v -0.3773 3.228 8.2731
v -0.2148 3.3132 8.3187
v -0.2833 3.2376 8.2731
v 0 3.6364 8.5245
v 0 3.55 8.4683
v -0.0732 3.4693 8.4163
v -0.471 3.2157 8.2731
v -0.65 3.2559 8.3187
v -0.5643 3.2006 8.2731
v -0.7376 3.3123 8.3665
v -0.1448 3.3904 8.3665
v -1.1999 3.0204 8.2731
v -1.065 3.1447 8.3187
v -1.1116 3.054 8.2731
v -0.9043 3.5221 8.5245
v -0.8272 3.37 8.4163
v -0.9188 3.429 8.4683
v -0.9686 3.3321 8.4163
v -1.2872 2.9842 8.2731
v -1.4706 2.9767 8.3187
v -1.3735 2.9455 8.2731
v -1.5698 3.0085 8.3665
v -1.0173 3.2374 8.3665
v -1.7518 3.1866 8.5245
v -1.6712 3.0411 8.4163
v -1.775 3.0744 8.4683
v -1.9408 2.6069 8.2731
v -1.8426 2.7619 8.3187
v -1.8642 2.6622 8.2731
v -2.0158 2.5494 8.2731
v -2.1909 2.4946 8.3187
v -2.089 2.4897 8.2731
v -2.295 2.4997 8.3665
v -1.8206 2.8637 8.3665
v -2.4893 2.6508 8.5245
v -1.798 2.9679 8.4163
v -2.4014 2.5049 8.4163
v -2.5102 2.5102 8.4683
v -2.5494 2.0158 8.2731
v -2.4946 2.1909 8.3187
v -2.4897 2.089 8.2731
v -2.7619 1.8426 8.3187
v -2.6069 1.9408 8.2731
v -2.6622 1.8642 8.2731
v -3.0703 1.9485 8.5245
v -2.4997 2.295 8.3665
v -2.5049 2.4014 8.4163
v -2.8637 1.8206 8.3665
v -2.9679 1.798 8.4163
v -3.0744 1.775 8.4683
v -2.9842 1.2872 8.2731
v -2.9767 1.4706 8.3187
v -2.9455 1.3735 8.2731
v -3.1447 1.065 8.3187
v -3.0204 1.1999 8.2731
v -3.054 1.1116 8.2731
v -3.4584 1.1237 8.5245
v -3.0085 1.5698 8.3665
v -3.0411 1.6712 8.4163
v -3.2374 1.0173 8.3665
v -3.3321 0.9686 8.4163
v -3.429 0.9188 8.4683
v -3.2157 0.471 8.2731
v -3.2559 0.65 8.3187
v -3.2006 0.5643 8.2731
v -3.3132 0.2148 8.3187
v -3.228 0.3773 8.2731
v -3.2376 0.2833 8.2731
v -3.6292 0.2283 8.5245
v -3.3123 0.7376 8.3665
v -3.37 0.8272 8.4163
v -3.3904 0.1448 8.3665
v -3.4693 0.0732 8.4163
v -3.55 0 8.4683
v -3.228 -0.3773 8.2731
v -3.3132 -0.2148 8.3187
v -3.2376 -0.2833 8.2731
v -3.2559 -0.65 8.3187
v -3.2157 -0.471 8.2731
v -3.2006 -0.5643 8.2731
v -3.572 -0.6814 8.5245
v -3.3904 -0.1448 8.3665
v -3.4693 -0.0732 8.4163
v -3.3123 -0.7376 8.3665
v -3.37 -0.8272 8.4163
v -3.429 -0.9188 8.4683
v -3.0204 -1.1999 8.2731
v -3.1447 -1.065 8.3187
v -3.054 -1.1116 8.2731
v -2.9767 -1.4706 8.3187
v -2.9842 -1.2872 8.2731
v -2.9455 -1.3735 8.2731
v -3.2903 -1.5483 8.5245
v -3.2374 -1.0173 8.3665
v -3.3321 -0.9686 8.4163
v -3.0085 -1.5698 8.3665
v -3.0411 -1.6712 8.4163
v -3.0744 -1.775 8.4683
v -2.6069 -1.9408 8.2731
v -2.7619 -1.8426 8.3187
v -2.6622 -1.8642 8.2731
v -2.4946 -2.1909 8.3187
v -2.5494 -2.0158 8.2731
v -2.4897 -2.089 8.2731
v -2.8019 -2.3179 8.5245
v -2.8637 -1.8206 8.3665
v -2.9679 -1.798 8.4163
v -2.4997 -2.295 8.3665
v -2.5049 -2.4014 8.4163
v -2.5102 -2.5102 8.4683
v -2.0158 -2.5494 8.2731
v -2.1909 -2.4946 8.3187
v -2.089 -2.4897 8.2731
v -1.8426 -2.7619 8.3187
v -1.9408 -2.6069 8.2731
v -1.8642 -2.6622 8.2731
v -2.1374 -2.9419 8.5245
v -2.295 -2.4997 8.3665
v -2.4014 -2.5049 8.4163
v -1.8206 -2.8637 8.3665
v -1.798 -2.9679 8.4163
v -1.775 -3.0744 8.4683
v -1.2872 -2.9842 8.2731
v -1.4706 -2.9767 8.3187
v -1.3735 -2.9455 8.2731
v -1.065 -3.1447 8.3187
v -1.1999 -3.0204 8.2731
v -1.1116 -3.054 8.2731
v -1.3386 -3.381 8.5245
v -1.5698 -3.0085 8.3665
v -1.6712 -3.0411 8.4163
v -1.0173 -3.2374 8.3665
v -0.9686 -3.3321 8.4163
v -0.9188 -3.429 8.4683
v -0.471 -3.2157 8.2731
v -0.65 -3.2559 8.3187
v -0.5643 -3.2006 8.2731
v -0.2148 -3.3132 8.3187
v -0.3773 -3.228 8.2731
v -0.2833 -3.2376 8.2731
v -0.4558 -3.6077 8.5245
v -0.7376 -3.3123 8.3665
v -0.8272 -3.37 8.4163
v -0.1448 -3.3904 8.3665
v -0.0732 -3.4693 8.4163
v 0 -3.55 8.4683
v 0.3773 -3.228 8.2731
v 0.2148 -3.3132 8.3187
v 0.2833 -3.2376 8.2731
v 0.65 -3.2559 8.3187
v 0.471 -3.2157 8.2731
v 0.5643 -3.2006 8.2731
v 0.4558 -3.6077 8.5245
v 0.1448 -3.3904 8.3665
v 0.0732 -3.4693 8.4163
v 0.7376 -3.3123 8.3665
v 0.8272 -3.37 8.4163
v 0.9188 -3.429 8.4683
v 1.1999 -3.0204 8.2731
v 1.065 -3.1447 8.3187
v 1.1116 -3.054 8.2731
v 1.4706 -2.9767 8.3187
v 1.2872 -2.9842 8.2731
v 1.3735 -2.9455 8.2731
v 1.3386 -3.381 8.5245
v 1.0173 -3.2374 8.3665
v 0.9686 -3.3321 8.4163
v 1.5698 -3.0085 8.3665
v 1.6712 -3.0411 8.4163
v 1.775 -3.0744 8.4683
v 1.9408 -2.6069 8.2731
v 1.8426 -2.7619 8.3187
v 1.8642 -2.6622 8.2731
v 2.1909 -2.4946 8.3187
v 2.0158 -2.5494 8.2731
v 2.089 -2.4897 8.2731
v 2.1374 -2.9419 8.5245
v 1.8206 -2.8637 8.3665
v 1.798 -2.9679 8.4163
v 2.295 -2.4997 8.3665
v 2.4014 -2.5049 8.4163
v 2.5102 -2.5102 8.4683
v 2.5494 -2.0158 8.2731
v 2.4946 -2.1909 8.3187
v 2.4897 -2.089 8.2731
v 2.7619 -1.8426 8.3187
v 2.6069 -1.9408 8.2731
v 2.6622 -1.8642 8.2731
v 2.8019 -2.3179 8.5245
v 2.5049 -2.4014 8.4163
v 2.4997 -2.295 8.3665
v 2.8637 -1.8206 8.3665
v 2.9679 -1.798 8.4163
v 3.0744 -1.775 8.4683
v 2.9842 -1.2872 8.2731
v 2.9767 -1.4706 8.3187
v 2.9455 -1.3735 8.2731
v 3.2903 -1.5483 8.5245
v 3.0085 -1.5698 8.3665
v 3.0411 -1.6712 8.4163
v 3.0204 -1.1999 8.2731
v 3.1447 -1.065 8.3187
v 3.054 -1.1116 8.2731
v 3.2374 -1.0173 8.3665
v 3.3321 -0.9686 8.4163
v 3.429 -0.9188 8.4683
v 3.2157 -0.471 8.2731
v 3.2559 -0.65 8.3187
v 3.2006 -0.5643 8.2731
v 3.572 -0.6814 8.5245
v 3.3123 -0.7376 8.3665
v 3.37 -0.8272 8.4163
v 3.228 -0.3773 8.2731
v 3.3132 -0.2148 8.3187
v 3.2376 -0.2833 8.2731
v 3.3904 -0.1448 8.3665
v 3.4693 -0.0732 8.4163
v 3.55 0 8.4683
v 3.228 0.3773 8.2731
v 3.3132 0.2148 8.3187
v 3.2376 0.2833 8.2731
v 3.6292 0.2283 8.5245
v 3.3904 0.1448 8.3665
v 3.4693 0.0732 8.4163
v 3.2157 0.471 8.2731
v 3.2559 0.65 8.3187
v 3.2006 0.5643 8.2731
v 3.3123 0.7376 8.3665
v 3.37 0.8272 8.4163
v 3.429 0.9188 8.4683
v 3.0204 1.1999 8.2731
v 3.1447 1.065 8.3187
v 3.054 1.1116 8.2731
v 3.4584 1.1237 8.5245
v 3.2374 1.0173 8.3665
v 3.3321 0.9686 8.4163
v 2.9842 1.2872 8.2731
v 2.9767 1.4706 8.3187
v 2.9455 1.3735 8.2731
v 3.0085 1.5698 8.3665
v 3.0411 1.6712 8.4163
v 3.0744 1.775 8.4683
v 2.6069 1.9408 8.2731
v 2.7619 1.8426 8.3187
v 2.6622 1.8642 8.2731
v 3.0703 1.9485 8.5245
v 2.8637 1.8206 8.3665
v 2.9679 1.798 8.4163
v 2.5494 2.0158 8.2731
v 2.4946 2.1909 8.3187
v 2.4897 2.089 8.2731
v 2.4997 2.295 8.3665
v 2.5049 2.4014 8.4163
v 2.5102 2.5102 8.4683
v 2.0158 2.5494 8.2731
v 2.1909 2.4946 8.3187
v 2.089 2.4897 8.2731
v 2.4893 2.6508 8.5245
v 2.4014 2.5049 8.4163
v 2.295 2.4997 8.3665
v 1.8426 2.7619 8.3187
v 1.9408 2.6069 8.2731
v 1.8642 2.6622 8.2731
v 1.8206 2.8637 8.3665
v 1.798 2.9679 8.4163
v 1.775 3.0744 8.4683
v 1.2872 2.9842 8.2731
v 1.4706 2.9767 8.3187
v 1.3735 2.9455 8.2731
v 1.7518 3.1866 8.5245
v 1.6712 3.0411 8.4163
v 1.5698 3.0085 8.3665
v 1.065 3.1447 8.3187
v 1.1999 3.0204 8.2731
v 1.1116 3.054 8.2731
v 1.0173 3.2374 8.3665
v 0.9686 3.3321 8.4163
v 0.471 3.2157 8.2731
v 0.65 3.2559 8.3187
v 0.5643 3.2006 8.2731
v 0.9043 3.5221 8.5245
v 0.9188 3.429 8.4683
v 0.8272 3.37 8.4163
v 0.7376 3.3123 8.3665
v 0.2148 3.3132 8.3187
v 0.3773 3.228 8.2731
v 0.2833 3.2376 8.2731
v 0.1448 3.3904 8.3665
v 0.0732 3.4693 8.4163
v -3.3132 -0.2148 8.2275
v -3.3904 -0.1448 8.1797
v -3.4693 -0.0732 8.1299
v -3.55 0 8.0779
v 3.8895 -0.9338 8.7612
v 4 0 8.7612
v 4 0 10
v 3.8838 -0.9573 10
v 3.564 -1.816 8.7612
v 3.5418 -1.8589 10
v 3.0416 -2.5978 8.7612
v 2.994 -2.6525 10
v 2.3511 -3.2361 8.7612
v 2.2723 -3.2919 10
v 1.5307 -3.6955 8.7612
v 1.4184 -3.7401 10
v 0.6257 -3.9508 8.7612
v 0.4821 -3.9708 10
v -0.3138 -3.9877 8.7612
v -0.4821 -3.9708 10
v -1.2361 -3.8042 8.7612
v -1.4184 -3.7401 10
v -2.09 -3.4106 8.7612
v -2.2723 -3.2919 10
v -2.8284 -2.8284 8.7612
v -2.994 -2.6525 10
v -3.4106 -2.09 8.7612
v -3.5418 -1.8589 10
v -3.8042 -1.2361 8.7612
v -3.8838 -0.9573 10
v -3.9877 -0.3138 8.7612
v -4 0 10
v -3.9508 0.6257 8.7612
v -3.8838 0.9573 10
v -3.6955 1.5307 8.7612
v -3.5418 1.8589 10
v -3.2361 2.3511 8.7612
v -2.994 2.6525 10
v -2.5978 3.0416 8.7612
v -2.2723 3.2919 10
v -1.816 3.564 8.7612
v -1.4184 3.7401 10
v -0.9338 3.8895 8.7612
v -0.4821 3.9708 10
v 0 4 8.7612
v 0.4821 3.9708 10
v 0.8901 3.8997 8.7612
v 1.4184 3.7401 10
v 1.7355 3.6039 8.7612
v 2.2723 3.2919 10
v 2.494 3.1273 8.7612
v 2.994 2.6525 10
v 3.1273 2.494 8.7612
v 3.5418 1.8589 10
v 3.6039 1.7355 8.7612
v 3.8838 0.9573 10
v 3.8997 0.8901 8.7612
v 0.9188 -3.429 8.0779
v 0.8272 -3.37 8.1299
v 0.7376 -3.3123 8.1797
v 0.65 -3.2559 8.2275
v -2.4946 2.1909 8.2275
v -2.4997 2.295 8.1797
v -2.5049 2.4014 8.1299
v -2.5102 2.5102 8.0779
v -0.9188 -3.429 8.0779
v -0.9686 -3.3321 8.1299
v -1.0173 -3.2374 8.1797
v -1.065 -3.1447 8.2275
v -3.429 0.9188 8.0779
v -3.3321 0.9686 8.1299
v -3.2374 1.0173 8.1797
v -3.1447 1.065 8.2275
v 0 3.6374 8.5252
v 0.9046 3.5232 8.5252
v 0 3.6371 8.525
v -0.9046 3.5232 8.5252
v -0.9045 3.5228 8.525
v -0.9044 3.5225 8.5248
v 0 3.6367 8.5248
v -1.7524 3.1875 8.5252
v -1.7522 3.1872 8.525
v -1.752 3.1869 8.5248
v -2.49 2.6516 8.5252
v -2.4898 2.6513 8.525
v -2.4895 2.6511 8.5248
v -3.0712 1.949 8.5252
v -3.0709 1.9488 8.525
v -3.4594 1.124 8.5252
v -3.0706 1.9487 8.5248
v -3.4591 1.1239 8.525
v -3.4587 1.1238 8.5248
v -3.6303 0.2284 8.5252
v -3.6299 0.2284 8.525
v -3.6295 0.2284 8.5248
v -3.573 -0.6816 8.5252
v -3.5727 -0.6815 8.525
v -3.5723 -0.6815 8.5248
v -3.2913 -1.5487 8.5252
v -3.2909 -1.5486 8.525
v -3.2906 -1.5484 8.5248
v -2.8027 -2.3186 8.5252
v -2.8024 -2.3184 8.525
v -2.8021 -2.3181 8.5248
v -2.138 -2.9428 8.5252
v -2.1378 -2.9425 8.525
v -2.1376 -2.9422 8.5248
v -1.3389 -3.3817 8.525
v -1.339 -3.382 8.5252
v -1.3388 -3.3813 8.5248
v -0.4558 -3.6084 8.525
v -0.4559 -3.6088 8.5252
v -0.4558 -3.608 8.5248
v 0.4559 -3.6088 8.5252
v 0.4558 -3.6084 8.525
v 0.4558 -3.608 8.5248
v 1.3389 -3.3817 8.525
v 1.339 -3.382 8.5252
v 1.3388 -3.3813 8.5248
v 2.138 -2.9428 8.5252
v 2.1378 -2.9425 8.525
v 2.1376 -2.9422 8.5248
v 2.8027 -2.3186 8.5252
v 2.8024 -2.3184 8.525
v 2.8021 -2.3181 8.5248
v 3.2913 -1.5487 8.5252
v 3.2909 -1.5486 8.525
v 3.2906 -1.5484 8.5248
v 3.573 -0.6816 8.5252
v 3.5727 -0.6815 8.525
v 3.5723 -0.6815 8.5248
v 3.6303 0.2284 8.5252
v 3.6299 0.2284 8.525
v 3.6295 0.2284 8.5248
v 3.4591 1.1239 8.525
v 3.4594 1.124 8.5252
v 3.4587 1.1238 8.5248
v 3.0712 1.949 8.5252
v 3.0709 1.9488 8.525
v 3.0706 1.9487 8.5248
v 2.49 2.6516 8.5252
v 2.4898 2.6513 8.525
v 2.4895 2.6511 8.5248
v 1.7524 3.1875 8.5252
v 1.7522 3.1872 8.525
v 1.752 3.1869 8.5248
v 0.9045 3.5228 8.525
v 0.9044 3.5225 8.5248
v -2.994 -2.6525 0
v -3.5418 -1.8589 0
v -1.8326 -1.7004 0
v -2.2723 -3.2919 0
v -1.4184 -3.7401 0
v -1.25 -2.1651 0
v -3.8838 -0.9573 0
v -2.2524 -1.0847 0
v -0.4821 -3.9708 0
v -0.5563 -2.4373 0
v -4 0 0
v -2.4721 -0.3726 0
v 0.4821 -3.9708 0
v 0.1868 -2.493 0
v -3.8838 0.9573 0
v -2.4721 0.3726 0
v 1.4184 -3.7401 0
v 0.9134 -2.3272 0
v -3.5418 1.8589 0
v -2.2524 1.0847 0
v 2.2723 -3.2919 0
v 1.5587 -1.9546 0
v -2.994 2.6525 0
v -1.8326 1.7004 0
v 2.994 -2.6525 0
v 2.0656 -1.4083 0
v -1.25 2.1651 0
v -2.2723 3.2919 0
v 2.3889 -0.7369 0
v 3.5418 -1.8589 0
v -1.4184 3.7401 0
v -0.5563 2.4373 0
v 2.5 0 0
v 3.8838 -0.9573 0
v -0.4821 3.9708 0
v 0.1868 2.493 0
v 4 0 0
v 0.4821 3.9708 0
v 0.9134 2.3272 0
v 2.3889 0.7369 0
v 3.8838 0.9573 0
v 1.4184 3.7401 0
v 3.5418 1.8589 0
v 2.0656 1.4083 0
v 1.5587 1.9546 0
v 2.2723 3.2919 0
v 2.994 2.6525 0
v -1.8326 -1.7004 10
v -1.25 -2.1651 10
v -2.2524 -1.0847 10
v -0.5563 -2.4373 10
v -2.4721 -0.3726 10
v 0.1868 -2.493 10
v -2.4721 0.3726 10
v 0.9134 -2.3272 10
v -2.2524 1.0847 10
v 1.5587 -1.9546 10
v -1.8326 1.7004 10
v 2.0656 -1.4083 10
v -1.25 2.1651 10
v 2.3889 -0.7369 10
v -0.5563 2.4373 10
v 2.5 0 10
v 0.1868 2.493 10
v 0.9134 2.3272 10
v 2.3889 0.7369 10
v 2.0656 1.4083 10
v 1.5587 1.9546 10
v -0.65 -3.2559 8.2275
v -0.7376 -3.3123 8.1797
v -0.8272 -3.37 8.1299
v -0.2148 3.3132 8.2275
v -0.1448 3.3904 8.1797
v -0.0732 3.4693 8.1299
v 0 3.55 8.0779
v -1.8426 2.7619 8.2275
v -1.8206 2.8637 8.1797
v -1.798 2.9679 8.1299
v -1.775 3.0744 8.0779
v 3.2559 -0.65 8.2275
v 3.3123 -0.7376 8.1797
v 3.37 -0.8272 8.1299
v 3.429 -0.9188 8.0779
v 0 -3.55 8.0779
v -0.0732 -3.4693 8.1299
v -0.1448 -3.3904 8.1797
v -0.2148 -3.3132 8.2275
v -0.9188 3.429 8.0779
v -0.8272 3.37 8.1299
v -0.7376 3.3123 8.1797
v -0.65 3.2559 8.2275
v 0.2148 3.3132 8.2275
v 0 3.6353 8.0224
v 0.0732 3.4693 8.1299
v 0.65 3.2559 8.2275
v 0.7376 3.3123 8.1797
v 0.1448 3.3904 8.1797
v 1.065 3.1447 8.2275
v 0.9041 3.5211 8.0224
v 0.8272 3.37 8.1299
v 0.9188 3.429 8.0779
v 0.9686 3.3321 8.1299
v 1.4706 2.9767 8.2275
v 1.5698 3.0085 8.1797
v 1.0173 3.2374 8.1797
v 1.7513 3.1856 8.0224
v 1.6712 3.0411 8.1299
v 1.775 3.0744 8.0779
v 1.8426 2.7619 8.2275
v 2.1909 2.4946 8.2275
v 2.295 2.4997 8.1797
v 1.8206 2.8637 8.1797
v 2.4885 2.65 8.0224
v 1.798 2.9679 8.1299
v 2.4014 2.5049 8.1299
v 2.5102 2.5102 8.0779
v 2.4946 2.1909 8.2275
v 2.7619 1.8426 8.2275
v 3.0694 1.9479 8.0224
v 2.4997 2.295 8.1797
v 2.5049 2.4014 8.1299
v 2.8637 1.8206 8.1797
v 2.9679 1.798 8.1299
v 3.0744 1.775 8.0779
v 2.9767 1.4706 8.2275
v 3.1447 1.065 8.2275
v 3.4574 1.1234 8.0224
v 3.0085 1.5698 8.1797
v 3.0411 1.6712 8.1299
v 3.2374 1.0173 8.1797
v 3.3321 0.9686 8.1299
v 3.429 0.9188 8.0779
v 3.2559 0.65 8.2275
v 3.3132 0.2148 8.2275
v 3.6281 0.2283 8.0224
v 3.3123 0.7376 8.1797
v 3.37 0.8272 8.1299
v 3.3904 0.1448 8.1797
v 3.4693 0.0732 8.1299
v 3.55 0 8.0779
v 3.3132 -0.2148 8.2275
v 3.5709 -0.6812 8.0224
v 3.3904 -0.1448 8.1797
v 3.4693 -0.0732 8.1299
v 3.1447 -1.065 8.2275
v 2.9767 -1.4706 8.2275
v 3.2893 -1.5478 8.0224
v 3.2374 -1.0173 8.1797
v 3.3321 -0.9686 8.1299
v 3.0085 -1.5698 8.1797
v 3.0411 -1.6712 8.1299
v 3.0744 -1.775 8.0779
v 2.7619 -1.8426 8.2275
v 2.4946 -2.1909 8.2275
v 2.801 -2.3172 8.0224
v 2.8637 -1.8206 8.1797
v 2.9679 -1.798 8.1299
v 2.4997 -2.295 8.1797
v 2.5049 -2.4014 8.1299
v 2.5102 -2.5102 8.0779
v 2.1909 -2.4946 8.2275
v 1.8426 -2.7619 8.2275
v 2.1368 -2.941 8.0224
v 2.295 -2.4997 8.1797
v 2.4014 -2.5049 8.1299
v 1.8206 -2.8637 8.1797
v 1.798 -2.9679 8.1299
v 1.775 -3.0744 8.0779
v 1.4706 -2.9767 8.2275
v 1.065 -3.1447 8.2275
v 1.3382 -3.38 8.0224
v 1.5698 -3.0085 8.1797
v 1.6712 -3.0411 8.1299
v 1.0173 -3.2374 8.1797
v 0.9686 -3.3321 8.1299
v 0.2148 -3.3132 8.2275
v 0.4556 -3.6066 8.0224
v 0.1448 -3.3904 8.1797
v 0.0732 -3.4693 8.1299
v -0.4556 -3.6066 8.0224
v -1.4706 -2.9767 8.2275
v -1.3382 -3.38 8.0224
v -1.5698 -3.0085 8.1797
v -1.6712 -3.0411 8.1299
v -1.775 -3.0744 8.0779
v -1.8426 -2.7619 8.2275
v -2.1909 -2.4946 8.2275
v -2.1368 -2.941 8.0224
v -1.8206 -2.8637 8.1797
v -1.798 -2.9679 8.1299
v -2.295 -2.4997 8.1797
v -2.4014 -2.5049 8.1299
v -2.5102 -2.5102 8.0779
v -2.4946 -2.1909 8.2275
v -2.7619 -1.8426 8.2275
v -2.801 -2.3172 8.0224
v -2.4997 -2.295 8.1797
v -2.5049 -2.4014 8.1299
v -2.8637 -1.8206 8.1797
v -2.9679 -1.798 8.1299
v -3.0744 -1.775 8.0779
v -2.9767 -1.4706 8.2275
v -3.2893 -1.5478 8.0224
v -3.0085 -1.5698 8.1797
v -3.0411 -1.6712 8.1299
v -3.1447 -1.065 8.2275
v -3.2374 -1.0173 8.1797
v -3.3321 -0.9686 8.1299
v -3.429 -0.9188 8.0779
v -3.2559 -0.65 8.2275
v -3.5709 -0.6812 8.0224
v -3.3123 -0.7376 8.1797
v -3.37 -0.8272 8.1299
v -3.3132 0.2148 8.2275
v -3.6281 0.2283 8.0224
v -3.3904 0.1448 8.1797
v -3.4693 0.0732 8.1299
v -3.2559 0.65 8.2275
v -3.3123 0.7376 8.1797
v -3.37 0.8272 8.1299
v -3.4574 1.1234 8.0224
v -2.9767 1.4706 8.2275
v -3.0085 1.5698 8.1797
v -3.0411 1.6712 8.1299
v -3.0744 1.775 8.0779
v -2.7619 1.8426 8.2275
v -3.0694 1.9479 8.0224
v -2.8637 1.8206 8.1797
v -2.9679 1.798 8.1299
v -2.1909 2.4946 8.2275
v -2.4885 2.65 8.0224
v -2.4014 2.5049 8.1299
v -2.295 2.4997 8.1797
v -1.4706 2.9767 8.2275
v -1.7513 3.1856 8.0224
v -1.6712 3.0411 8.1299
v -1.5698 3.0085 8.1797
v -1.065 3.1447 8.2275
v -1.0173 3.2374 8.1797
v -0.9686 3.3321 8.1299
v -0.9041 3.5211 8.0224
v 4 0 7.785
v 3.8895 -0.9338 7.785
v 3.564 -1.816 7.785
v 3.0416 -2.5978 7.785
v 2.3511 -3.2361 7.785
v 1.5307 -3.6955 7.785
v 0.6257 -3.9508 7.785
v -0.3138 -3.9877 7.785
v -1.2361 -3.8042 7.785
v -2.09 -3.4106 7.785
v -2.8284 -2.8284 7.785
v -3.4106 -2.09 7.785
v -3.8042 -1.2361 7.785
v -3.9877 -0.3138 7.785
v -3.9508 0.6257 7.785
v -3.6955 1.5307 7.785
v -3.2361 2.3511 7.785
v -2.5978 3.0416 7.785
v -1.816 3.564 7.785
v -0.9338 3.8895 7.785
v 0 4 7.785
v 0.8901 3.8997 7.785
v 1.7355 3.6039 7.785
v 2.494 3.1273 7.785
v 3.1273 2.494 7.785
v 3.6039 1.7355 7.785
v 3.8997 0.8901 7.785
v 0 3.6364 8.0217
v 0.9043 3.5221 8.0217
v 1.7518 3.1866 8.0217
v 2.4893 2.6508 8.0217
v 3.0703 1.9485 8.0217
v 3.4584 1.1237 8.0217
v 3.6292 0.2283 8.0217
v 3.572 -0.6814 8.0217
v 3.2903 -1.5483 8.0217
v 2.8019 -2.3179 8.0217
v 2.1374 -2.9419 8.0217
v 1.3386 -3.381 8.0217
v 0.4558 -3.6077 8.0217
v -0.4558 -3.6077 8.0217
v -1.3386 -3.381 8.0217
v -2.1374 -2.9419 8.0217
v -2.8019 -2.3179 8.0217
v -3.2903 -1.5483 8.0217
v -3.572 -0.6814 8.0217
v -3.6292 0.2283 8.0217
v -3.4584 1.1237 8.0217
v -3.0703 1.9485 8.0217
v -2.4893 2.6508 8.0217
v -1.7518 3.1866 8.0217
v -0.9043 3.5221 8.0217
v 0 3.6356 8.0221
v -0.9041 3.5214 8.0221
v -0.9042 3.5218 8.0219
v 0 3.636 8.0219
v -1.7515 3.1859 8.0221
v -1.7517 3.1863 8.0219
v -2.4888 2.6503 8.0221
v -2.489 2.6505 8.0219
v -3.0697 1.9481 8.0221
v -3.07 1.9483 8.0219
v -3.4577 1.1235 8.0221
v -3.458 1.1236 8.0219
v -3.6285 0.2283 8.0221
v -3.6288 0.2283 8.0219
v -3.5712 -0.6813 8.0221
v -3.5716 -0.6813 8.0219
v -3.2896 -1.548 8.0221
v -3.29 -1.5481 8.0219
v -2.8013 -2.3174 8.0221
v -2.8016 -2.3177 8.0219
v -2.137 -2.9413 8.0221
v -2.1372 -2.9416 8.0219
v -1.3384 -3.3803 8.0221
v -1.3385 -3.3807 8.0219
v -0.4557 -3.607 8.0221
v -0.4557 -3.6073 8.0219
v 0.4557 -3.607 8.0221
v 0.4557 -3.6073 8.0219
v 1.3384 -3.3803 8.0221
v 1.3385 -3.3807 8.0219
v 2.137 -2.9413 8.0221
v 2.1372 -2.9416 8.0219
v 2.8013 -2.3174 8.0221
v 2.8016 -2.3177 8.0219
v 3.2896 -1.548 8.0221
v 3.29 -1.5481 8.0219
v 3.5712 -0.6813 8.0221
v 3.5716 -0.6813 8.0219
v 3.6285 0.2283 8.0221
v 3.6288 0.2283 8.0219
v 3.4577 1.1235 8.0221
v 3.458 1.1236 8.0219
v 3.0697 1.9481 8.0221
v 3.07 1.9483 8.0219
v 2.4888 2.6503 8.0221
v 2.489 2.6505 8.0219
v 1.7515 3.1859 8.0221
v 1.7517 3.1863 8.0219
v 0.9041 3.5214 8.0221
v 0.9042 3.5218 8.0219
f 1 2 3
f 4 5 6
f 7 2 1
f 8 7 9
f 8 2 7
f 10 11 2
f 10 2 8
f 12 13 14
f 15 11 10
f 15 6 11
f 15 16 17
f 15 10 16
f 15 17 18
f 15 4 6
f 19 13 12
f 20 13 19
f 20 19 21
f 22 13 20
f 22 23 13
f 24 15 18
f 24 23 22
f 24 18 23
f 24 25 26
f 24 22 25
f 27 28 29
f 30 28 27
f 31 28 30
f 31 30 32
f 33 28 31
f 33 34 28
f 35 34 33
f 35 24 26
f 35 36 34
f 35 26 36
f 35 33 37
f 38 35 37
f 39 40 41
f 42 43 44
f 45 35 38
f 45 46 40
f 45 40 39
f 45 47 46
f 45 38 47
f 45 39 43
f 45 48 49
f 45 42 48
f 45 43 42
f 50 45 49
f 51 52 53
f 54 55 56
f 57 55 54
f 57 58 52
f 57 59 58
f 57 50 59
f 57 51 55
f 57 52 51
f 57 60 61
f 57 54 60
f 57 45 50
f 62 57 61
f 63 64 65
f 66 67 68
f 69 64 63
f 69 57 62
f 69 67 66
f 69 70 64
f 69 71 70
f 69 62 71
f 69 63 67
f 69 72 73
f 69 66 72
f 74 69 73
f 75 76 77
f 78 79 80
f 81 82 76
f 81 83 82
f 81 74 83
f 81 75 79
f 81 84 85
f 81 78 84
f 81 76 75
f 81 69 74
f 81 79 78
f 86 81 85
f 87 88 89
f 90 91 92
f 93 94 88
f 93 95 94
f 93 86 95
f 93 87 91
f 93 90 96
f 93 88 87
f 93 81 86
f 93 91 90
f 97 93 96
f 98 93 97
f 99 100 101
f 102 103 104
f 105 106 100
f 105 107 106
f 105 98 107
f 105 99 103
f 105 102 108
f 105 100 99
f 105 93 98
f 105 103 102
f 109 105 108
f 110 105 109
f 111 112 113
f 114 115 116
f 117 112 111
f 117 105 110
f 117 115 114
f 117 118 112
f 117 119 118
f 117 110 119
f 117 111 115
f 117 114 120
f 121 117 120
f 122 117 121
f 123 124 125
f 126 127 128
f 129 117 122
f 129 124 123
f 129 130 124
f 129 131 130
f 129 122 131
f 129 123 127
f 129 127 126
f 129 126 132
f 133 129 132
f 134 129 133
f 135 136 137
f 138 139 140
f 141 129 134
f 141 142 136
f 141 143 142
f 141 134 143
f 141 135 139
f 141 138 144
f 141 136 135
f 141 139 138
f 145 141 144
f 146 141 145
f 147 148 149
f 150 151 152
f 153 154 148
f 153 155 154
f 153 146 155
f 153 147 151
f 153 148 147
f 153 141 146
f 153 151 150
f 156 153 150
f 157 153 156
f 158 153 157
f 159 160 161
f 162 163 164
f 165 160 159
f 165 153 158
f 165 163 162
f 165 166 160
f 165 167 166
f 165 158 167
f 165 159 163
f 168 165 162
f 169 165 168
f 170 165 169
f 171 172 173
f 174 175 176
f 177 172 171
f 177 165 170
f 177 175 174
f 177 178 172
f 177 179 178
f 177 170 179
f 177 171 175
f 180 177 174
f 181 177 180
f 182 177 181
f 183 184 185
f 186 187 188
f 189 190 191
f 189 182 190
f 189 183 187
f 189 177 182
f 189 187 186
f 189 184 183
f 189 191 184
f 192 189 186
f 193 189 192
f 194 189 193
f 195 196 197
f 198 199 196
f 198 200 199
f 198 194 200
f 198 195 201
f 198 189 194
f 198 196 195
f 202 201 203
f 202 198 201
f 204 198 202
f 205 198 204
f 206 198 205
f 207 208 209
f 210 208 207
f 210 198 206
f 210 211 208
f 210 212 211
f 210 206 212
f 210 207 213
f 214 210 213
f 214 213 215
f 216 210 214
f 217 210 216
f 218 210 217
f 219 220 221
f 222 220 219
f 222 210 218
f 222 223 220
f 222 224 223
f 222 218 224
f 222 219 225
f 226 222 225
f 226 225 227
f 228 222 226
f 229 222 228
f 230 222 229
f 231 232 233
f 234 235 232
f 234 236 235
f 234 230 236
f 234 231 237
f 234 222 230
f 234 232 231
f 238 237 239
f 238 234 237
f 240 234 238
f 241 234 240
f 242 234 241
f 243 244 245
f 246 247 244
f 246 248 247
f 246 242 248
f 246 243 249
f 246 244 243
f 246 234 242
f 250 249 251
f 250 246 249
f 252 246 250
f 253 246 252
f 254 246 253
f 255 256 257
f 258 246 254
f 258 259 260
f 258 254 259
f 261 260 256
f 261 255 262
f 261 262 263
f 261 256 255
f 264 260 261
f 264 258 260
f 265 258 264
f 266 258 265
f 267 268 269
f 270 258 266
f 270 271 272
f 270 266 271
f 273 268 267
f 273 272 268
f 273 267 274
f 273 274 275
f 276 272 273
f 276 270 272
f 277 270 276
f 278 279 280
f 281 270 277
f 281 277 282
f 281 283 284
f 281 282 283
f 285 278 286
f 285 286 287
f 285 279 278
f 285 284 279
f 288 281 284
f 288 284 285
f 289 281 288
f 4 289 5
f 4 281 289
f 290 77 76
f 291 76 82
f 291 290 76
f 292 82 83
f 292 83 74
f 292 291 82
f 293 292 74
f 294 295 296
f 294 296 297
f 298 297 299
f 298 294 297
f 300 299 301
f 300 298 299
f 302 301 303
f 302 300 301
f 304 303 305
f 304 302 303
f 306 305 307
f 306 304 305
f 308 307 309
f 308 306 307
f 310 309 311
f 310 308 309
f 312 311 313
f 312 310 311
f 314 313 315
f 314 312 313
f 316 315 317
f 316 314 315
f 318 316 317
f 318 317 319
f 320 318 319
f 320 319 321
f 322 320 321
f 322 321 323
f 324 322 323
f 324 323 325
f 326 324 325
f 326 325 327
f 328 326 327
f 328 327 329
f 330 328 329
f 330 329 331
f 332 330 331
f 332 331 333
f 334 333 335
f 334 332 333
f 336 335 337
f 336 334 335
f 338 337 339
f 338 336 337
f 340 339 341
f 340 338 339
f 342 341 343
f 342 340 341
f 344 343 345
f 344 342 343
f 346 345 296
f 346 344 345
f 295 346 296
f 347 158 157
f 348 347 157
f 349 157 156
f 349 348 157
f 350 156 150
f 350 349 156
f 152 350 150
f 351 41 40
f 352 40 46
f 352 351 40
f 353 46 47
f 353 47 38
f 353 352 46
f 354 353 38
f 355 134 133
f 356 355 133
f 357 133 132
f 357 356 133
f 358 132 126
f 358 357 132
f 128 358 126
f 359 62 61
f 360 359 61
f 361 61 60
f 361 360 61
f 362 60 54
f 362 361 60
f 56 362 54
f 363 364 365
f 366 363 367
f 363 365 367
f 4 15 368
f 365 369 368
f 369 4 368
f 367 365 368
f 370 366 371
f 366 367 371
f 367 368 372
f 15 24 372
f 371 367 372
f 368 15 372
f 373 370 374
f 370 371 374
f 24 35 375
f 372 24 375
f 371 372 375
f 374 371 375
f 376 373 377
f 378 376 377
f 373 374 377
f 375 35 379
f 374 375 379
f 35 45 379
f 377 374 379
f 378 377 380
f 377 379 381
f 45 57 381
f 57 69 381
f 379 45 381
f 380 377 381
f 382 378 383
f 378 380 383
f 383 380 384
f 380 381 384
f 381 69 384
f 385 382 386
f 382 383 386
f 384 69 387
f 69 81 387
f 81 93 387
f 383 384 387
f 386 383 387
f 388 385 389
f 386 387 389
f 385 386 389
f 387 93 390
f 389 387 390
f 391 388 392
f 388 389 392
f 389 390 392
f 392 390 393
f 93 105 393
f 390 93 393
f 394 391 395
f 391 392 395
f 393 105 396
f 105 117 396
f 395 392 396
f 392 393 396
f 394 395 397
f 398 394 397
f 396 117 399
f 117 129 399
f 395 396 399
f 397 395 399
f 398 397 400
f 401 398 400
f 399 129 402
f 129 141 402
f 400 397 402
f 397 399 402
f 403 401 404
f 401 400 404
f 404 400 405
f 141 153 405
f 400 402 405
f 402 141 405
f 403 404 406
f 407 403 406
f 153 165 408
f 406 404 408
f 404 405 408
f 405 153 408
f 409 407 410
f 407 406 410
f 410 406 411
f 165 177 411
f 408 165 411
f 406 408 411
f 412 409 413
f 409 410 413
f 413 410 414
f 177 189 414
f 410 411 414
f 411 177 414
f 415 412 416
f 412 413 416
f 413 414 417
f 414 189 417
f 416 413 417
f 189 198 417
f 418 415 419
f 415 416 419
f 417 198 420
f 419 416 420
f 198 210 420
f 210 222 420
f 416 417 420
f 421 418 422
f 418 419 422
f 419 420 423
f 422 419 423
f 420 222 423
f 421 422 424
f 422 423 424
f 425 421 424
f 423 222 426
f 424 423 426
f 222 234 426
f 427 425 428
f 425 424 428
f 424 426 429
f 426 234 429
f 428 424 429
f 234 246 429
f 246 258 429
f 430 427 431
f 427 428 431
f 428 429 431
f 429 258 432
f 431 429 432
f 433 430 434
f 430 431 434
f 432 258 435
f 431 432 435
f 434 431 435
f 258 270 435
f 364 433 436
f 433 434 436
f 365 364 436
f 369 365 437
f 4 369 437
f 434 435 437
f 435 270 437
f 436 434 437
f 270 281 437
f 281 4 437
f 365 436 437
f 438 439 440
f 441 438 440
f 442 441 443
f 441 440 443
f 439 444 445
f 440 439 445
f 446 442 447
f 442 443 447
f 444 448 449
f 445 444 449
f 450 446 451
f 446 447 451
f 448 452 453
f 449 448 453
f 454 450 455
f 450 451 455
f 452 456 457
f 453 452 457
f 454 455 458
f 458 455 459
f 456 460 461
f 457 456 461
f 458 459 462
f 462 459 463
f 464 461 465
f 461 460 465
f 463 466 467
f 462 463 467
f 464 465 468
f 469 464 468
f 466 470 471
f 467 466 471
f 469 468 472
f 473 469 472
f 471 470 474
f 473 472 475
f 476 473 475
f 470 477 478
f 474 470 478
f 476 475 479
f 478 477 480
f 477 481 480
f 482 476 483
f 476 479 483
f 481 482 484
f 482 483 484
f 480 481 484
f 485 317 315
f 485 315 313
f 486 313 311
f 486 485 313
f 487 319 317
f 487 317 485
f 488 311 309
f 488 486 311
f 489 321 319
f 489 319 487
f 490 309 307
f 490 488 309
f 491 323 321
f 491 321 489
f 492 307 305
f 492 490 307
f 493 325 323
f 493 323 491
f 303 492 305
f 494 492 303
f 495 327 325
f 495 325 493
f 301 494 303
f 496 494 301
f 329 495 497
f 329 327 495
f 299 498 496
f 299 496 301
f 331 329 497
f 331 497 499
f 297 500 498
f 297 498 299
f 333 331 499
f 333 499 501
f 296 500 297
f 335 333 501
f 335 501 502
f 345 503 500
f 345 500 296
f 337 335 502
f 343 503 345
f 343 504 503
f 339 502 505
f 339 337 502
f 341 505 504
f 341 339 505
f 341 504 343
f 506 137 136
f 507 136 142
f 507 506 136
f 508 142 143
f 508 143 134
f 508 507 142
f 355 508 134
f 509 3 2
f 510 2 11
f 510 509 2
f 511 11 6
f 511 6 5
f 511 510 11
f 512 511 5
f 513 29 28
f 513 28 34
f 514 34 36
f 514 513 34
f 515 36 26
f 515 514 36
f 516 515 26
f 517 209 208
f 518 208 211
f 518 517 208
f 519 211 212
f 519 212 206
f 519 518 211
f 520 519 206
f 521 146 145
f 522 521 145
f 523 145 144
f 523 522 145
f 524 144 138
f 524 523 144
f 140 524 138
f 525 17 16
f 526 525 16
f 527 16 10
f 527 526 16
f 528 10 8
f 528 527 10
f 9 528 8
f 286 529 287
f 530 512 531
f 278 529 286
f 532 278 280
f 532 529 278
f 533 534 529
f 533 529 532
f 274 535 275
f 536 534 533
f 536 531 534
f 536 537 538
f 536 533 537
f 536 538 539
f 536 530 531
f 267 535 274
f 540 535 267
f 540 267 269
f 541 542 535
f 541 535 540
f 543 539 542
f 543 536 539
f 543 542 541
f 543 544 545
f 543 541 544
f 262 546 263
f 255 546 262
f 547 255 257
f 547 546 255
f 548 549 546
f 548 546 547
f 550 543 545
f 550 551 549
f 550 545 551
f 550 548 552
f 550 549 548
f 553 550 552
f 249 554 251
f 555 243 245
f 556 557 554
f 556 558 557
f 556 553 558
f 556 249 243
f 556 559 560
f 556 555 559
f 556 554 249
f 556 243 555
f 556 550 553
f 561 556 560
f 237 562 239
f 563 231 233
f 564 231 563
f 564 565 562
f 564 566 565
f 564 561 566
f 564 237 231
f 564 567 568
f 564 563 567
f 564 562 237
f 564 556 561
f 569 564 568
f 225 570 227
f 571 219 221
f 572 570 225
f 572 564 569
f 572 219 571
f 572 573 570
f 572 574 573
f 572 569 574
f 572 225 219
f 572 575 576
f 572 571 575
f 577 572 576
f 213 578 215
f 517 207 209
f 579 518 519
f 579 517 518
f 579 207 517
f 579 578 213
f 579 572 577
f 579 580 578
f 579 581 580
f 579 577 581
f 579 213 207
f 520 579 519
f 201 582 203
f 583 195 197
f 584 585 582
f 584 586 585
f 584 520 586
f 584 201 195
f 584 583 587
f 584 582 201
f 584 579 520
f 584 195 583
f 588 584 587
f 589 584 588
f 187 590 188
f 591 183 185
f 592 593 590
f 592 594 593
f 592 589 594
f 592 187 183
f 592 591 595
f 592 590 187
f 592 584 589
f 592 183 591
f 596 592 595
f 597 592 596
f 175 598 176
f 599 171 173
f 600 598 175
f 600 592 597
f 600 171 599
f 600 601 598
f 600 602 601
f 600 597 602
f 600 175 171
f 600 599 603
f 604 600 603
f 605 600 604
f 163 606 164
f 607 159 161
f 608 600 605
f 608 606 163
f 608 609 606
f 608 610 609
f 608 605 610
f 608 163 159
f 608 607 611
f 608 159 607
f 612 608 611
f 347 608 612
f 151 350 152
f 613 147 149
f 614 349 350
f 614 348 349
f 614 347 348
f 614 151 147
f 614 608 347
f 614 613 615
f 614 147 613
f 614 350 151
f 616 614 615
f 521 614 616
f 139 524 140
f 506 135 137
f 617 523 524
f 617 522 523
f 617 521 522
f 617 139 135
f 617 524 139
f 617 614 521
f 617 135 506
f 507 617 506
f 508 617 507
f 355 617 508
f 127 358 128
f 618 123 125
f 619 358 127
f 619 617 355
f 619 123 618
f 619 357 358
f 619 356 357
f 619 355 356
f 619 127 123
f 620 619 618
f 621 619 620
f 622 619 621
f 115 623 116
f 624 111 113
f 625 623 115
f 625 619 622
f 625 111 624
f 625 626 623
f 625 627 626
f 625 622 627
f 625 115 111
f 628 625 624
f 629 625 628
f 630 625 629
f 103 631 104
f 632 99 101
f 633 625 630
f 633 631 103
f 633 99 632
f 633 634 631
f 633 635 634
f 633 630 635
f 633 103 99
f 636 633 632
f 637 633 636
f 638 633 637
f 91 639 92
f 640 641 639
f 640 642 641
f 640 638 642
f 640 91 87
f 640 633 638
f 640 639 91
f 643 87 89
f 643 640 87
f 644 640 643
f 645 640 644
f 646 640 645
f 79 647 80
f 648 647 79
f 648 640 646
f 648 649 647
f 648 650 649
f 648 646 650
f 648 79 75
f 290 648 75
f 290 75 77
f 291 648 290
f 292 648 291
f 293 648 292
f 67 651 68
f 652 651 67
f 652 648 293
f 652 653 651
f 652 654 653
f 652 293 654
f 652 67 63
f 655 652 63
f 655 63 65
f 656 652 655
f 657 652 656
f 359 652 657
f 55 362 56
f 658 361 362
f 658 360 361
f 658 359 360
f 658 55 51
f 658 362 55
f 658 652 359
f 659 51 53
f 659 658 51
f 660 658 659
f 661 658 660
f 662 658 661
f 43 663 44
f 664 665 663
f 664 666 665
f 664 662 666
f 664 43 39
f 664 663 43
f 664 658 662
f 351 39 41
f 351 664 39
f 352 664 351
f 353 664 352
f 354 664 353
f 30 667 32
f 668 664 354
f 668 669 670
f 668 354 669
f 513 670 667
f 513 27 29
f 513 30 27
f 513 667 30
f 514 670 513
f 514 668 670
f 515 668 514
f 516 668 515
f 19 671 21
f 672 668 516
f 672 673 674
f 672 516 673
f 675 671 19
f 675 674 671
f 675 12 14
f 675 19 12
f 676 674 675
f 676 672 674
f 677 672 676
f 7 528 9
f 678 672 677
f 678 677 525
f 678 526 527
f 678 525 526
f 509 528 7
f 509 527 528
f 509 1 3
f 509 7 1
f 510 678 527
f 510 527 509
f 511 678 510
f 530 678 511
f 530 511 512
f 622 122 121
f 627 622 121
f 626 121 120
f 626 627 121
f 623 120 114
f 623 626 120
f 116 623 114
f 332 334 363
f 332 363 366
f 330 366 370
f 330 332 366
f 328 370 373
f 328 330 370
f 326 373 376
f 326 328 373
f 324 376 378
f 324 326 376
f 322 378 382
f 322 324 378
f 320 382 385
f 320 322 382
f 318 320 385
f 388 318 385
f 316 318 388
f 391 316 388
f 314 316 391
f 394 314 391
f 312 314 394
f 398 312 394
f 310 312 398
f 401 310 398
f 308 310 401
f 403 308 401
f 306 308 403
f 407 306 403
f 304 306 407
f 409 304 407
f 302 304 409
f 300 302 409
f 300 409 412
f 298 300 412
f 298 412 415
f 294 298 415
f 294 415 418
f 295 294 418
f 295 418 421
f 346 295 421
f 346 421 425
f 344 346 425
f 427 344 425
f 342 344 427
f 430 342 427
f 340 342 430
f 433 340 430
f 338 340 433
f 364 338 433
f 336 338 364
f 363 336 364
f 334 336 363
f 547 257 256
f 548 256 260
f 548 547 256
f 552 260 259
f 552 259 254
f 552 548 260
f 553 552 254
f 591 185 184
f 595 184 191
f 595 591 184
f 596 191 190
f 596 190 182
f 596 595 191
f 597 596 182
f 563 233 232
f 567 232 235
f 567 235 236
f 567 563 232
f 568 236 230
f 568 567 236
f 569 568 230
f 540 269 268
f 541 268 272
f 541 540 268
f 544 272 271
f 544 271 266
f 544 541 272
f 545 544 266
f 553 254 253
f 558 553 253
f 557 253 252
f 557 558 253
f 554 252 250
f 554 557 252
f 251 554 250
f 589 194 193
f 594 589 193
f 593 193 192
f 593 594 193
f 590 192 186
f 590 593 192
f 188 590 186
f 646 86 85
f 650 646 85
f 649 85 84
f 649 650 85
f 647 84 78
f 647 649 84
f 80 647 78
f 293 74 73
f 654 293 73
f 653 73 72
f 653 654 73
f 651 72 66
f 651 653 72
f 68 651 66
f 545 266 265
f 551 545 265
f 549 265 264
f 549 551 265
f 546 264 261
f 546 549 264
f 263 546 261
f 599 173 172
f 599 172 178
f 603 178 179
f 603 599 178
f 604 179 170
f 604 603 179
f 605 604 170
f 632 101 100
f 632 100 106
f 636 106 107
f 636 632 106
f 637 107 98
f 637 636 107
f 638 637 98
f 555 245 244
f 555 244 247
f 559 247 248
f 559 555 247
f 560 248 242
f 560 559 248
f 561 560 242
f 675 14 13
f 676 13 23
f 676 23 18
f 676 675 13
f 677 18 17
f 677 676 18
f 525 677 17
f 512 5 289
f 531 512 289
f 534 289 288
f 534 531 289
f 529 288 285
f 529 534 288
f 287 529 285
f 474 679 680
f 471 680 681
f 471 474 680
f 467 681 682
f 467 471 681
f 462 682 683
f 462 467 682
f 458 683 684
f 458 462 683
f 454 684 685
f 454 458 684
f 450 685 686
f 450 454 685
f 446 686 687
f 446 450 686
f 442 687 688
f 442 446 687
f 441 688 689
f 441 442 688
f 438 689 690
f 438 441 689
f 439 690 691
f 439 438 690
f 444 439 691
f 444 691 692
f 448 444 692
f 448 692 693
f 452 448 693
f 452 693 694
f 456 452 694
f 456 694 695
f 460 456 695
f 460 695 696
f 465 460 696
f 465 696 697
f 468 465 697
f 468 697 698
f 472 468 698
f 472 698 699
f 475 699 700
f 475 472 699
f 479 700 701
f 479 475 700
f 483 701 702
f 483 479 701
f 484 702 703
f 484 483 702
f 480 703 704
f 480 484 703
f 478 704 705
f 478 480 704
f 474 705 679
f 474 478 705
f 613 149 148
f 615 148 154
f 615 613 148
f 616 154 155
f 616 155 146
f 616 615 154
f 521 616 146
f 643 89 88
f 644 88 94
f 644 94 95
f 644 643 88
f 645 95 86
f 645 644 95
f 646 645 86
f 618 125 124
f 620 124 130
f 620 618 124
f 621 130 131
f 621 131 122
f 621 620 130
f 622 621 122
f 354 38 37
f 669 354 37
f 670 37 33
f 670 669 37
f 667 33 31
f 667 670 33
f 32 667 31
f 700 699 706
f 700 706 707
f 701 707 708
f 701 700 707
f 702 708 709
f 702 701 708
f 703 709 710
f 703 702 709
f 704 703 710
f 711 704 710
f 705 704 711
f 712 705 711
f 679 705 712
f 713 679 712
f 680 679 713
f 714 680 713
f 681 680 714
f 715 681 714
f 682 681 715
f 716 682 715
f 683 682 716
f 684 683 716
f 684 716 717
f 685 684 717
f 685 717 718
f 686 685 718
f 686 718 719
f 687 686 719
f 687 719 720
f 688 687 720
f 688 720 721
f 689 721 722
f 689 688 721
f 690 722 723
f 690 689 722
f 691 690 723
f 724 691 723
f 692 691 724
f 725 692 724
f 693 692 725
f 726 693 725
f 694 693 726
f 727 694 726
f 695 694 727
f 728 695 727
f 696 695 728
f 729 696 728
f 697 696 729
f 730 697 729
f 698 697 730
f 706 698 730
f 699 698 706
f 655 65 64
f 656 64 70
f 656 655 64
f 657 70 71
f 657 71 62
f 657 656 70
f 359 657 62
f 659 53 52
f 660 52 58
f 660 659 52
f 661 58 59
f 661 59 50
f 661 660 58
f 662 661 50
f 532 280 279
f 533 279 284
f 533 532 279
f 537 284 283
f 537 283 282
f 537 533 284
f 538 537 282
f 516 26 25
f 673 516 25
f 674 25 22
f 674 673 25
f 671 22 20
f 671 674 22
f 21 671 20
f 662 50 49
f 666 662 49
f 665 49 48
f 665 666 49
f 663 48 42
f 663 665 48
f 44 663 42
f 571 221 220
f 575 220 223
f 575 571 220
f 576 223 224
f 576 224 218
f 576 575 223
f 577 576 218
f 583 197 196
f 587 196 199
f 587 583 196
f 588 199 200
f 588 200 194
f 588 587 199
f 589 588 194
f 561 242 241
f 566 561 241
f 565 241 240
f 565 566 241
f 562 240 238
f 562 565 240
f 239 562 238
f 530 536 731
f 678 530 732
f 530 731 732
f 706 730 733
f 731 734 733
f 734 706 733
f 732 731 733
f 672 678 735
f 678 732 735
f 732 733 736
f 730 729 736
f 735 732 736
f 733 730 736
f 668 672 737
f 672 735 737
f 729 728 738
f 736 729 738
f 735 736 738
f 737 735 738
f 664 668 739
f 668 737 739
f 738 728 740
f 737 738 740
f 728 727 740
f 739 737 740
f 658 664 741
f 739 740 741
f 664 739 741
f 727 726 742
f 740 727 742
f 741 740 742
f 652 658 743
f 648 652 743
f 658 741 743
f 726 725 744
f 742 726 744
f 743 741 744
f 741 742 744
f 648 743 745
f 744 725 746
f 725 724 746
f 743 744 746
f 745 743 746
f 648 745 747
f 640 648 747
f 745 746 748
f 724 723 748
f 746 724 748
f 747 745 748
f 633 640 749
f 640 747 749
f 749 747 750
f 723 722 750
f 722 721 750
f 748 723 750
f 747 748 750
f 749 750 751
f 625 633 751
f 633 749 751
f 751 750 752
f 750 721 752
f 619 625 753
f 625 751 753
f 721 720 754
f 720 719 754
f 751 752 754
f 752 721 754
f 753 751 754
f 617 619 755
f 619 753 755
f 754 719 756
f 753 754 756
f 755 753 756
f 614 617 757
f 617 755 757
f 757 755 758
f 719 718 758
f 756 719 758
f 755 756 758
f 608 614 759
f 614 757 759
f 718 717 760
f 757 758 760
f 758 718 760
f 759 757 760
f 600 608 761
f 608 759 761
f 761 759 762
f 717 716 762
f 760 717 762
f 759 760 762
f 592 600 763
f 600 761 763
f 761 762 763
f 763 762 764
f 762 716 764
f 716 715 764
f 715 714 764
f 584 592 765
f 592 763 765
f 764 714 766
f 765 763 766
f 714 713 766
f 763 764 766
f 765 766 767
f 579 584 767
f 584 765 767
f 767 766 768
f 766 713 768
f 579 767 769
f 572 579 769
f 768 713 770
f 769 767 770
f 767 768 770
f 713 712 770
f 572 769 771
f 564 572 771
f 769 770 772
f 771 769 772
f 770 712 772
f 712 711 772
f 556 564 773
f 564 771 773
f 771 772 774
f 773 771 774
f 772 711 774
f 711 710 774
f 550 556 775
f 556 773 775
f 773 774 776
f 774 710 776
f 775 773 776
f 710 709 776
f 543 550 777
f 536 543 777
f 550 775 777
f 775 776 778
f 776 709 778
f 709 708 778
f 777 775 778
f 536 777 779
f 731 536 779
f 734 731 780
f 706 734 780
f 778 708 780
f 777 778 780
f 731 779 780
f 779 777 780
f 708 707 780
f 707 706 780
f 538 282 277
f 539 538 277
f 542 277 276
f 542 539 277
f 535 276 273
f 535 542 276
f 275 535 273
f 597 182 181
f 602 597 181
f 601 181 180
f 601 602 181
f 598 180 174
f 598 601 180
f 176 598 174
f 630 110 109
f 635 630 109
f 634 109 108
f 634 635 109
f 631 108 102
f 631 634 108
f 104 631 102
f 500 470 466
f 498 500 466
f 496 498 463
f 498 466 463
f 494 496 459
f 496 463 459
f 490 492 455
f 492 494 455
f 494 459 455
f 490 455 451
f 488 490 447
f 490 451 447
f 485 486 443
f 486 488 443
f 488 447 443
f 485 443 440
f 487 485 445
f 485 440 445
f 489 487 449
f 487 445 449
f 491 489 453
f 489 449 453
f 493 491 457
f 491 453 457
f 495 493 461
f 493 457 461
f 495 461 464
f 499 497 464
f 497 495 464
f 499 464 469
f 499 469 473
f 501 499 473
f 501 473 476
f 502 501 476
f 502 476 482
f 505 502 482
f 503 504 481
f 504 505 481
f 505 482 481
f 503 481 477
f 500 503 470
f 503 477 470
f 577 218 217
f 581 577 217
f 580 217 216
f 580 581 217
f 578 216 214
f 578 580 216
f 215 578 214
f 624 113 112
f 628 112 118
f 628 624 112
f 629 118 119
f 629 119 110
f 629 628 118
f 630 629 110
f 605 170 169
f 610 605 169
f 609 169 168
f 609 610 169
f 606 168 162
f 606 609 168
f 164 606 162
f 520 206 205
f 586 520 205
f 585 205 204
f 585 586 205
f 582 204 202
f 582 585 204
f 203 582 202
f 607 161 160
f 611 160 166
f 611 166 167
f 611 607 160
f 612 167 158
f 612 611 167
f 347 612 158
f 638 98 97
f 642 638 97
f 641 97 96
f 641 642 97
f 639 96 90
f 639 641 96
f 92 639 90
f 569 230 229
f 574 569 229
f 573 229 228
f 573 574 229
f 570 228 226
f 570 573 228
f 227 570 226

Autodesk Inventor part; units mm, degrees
ref_plane "YZ Plane" through (0, 0, 0) normal (1, 0, 0) x (0, 1, 0)
ref_plane "XZ Plane" through (0, 0, 0) normal (0, 1, 0) x (-1, 0, 0)
sketch "Sketch1" plane through (0, 0, 0) normal (0, 0, 1) x (1, 0, 0)
  circle A0 centre (0, 0) radius 2.5
  circle A1 centre (0, 0) radius 4
  line L0 (-3.5063, 3.5) -> (5.715, 3.5) construction
  line L1 (-3.4532, 4.1) -> (5.7681, 4.1) construction
  dimension "d0" = 5
  dimension "d1" = 0.6
  dimension "d2" = 0.1
  dimension "d3" = 1
extrude "Extrusion1" add sketch "Sketch1" along normal blind 10
sketch "Sketch2" plane through (0, 0, 0) normal (1, 0, 0) x (0, 1, 0)
  line L0 (4, 10) -> (-4, 10) projected
  line L1 (-4, 0) -> (4, 0) projected
  line L2 (4, 10) -> (4, 8.7612)
  line L3 (4, 0) -> (4, 10) projected
  circle A0 centre (3.8, 8.2731) radius 0.3
  line L4 (4, 8.7612) -> (3.25, 8.2731)
  line L5 (3.25, 8.2731) -> (4, 7.785)
  line L6 (2.5, 0) -> (2.5, 10) projected
  line L7 (0, -2) -> (0, 12) projected
  point P0 (0, 0)
  dimension "d6" = 0.6
  dimension "d7" = 0.1
  dimension "d8" = 0.75
revolve "Revolution1" cut sketch "Sketch2" angle 360 about axis through (0, 0, -10) along (0, 0, 1) picked at (3.9033, 8.3516) contours L3 A0 L4 | L3 A0 | A0 L5 L4 | L3 L5 A0
ref_plane "Work Plane1" through (0, 3.25, 8.2731) normal (0, 0, 1) x (1, 0, 0)
sketch "Sketch4" plane through (0, 3.25, 8.2731) normal (0, 0, 1) x (1, 0, 0)
  line L0 (-1.6699, 0.85) -> (1.5938, 0.85) construction
  line L1 (-1.4284, 0.3) -> (1.8353, 0.3) construction
  circle A0 centre (0, -3.25) radius 4 projected
  circle A1 centre (0, -3.25) radius 3.25 projected
  line L2 (0, -3.25) -> (-0.2833, -0.0124)
  line L3 (0, -3.25) -> (0.2833, -0.0124)
  arc A2 (0.2833, -0.0124) -> (-0.2833, -0.0124) centre (0, -3.25) ccw
  line L4 (-0.2833, -0.0124) -> (0, 0.3)
  line L5 (0, 0.3) -> (0.2833, -0.0124)
  point P0 (0, 0)
  dimension "d16" = 0.55
  dimension "d17" = 0.1
  dimension "d18" = 10
extrude "Extrusion3" add sketch "Sketch4" along normal through all both and the other way through all contours A1 L4 L5
sketch "Sketch3" plane through (0, 3.25, 8.2731) normal (0, 0, 1) x (1, 0, 0)
  line L0 (0, -3.25) -> (-0.1745, 0.7462) construction
  circle A0 centre (0, -3.25) radius 4 projected
  line L1 (0, -3.25) -> (0.1745, 0.7462) construction
  arc A1 (0.1745, 0.7462) -> (-0.1745, 0.7462) centre (0, -3.25) ccw
  circle A2 centre (0, -3.25) radius 3.25 projected
  arc A3 (0.1418, -0.0031) -> (-0.1418, -0.0031) centre (0, -3.25) ccw
  line L2 (-0.1745, 0.7462) -> (-0.1418, -0.0031)
  line L3 (0.1418, -0.0031) -> (0.1745, 0.7462)
  line L4 (0, 0.75) -> (-0.1418, -0.0031)
  line L5 (0, 0.75) -> (0.1418, -0.0031)
  point P0 (0, 0)
  dimension "d10" = 5
pattern_circular "Circular Pattern2" count 24 over 360 about axis through (0, 0, -10) along (0, 0, 1) of "Extrusion3"
properties part number "Thoughts for a new driver gear"
